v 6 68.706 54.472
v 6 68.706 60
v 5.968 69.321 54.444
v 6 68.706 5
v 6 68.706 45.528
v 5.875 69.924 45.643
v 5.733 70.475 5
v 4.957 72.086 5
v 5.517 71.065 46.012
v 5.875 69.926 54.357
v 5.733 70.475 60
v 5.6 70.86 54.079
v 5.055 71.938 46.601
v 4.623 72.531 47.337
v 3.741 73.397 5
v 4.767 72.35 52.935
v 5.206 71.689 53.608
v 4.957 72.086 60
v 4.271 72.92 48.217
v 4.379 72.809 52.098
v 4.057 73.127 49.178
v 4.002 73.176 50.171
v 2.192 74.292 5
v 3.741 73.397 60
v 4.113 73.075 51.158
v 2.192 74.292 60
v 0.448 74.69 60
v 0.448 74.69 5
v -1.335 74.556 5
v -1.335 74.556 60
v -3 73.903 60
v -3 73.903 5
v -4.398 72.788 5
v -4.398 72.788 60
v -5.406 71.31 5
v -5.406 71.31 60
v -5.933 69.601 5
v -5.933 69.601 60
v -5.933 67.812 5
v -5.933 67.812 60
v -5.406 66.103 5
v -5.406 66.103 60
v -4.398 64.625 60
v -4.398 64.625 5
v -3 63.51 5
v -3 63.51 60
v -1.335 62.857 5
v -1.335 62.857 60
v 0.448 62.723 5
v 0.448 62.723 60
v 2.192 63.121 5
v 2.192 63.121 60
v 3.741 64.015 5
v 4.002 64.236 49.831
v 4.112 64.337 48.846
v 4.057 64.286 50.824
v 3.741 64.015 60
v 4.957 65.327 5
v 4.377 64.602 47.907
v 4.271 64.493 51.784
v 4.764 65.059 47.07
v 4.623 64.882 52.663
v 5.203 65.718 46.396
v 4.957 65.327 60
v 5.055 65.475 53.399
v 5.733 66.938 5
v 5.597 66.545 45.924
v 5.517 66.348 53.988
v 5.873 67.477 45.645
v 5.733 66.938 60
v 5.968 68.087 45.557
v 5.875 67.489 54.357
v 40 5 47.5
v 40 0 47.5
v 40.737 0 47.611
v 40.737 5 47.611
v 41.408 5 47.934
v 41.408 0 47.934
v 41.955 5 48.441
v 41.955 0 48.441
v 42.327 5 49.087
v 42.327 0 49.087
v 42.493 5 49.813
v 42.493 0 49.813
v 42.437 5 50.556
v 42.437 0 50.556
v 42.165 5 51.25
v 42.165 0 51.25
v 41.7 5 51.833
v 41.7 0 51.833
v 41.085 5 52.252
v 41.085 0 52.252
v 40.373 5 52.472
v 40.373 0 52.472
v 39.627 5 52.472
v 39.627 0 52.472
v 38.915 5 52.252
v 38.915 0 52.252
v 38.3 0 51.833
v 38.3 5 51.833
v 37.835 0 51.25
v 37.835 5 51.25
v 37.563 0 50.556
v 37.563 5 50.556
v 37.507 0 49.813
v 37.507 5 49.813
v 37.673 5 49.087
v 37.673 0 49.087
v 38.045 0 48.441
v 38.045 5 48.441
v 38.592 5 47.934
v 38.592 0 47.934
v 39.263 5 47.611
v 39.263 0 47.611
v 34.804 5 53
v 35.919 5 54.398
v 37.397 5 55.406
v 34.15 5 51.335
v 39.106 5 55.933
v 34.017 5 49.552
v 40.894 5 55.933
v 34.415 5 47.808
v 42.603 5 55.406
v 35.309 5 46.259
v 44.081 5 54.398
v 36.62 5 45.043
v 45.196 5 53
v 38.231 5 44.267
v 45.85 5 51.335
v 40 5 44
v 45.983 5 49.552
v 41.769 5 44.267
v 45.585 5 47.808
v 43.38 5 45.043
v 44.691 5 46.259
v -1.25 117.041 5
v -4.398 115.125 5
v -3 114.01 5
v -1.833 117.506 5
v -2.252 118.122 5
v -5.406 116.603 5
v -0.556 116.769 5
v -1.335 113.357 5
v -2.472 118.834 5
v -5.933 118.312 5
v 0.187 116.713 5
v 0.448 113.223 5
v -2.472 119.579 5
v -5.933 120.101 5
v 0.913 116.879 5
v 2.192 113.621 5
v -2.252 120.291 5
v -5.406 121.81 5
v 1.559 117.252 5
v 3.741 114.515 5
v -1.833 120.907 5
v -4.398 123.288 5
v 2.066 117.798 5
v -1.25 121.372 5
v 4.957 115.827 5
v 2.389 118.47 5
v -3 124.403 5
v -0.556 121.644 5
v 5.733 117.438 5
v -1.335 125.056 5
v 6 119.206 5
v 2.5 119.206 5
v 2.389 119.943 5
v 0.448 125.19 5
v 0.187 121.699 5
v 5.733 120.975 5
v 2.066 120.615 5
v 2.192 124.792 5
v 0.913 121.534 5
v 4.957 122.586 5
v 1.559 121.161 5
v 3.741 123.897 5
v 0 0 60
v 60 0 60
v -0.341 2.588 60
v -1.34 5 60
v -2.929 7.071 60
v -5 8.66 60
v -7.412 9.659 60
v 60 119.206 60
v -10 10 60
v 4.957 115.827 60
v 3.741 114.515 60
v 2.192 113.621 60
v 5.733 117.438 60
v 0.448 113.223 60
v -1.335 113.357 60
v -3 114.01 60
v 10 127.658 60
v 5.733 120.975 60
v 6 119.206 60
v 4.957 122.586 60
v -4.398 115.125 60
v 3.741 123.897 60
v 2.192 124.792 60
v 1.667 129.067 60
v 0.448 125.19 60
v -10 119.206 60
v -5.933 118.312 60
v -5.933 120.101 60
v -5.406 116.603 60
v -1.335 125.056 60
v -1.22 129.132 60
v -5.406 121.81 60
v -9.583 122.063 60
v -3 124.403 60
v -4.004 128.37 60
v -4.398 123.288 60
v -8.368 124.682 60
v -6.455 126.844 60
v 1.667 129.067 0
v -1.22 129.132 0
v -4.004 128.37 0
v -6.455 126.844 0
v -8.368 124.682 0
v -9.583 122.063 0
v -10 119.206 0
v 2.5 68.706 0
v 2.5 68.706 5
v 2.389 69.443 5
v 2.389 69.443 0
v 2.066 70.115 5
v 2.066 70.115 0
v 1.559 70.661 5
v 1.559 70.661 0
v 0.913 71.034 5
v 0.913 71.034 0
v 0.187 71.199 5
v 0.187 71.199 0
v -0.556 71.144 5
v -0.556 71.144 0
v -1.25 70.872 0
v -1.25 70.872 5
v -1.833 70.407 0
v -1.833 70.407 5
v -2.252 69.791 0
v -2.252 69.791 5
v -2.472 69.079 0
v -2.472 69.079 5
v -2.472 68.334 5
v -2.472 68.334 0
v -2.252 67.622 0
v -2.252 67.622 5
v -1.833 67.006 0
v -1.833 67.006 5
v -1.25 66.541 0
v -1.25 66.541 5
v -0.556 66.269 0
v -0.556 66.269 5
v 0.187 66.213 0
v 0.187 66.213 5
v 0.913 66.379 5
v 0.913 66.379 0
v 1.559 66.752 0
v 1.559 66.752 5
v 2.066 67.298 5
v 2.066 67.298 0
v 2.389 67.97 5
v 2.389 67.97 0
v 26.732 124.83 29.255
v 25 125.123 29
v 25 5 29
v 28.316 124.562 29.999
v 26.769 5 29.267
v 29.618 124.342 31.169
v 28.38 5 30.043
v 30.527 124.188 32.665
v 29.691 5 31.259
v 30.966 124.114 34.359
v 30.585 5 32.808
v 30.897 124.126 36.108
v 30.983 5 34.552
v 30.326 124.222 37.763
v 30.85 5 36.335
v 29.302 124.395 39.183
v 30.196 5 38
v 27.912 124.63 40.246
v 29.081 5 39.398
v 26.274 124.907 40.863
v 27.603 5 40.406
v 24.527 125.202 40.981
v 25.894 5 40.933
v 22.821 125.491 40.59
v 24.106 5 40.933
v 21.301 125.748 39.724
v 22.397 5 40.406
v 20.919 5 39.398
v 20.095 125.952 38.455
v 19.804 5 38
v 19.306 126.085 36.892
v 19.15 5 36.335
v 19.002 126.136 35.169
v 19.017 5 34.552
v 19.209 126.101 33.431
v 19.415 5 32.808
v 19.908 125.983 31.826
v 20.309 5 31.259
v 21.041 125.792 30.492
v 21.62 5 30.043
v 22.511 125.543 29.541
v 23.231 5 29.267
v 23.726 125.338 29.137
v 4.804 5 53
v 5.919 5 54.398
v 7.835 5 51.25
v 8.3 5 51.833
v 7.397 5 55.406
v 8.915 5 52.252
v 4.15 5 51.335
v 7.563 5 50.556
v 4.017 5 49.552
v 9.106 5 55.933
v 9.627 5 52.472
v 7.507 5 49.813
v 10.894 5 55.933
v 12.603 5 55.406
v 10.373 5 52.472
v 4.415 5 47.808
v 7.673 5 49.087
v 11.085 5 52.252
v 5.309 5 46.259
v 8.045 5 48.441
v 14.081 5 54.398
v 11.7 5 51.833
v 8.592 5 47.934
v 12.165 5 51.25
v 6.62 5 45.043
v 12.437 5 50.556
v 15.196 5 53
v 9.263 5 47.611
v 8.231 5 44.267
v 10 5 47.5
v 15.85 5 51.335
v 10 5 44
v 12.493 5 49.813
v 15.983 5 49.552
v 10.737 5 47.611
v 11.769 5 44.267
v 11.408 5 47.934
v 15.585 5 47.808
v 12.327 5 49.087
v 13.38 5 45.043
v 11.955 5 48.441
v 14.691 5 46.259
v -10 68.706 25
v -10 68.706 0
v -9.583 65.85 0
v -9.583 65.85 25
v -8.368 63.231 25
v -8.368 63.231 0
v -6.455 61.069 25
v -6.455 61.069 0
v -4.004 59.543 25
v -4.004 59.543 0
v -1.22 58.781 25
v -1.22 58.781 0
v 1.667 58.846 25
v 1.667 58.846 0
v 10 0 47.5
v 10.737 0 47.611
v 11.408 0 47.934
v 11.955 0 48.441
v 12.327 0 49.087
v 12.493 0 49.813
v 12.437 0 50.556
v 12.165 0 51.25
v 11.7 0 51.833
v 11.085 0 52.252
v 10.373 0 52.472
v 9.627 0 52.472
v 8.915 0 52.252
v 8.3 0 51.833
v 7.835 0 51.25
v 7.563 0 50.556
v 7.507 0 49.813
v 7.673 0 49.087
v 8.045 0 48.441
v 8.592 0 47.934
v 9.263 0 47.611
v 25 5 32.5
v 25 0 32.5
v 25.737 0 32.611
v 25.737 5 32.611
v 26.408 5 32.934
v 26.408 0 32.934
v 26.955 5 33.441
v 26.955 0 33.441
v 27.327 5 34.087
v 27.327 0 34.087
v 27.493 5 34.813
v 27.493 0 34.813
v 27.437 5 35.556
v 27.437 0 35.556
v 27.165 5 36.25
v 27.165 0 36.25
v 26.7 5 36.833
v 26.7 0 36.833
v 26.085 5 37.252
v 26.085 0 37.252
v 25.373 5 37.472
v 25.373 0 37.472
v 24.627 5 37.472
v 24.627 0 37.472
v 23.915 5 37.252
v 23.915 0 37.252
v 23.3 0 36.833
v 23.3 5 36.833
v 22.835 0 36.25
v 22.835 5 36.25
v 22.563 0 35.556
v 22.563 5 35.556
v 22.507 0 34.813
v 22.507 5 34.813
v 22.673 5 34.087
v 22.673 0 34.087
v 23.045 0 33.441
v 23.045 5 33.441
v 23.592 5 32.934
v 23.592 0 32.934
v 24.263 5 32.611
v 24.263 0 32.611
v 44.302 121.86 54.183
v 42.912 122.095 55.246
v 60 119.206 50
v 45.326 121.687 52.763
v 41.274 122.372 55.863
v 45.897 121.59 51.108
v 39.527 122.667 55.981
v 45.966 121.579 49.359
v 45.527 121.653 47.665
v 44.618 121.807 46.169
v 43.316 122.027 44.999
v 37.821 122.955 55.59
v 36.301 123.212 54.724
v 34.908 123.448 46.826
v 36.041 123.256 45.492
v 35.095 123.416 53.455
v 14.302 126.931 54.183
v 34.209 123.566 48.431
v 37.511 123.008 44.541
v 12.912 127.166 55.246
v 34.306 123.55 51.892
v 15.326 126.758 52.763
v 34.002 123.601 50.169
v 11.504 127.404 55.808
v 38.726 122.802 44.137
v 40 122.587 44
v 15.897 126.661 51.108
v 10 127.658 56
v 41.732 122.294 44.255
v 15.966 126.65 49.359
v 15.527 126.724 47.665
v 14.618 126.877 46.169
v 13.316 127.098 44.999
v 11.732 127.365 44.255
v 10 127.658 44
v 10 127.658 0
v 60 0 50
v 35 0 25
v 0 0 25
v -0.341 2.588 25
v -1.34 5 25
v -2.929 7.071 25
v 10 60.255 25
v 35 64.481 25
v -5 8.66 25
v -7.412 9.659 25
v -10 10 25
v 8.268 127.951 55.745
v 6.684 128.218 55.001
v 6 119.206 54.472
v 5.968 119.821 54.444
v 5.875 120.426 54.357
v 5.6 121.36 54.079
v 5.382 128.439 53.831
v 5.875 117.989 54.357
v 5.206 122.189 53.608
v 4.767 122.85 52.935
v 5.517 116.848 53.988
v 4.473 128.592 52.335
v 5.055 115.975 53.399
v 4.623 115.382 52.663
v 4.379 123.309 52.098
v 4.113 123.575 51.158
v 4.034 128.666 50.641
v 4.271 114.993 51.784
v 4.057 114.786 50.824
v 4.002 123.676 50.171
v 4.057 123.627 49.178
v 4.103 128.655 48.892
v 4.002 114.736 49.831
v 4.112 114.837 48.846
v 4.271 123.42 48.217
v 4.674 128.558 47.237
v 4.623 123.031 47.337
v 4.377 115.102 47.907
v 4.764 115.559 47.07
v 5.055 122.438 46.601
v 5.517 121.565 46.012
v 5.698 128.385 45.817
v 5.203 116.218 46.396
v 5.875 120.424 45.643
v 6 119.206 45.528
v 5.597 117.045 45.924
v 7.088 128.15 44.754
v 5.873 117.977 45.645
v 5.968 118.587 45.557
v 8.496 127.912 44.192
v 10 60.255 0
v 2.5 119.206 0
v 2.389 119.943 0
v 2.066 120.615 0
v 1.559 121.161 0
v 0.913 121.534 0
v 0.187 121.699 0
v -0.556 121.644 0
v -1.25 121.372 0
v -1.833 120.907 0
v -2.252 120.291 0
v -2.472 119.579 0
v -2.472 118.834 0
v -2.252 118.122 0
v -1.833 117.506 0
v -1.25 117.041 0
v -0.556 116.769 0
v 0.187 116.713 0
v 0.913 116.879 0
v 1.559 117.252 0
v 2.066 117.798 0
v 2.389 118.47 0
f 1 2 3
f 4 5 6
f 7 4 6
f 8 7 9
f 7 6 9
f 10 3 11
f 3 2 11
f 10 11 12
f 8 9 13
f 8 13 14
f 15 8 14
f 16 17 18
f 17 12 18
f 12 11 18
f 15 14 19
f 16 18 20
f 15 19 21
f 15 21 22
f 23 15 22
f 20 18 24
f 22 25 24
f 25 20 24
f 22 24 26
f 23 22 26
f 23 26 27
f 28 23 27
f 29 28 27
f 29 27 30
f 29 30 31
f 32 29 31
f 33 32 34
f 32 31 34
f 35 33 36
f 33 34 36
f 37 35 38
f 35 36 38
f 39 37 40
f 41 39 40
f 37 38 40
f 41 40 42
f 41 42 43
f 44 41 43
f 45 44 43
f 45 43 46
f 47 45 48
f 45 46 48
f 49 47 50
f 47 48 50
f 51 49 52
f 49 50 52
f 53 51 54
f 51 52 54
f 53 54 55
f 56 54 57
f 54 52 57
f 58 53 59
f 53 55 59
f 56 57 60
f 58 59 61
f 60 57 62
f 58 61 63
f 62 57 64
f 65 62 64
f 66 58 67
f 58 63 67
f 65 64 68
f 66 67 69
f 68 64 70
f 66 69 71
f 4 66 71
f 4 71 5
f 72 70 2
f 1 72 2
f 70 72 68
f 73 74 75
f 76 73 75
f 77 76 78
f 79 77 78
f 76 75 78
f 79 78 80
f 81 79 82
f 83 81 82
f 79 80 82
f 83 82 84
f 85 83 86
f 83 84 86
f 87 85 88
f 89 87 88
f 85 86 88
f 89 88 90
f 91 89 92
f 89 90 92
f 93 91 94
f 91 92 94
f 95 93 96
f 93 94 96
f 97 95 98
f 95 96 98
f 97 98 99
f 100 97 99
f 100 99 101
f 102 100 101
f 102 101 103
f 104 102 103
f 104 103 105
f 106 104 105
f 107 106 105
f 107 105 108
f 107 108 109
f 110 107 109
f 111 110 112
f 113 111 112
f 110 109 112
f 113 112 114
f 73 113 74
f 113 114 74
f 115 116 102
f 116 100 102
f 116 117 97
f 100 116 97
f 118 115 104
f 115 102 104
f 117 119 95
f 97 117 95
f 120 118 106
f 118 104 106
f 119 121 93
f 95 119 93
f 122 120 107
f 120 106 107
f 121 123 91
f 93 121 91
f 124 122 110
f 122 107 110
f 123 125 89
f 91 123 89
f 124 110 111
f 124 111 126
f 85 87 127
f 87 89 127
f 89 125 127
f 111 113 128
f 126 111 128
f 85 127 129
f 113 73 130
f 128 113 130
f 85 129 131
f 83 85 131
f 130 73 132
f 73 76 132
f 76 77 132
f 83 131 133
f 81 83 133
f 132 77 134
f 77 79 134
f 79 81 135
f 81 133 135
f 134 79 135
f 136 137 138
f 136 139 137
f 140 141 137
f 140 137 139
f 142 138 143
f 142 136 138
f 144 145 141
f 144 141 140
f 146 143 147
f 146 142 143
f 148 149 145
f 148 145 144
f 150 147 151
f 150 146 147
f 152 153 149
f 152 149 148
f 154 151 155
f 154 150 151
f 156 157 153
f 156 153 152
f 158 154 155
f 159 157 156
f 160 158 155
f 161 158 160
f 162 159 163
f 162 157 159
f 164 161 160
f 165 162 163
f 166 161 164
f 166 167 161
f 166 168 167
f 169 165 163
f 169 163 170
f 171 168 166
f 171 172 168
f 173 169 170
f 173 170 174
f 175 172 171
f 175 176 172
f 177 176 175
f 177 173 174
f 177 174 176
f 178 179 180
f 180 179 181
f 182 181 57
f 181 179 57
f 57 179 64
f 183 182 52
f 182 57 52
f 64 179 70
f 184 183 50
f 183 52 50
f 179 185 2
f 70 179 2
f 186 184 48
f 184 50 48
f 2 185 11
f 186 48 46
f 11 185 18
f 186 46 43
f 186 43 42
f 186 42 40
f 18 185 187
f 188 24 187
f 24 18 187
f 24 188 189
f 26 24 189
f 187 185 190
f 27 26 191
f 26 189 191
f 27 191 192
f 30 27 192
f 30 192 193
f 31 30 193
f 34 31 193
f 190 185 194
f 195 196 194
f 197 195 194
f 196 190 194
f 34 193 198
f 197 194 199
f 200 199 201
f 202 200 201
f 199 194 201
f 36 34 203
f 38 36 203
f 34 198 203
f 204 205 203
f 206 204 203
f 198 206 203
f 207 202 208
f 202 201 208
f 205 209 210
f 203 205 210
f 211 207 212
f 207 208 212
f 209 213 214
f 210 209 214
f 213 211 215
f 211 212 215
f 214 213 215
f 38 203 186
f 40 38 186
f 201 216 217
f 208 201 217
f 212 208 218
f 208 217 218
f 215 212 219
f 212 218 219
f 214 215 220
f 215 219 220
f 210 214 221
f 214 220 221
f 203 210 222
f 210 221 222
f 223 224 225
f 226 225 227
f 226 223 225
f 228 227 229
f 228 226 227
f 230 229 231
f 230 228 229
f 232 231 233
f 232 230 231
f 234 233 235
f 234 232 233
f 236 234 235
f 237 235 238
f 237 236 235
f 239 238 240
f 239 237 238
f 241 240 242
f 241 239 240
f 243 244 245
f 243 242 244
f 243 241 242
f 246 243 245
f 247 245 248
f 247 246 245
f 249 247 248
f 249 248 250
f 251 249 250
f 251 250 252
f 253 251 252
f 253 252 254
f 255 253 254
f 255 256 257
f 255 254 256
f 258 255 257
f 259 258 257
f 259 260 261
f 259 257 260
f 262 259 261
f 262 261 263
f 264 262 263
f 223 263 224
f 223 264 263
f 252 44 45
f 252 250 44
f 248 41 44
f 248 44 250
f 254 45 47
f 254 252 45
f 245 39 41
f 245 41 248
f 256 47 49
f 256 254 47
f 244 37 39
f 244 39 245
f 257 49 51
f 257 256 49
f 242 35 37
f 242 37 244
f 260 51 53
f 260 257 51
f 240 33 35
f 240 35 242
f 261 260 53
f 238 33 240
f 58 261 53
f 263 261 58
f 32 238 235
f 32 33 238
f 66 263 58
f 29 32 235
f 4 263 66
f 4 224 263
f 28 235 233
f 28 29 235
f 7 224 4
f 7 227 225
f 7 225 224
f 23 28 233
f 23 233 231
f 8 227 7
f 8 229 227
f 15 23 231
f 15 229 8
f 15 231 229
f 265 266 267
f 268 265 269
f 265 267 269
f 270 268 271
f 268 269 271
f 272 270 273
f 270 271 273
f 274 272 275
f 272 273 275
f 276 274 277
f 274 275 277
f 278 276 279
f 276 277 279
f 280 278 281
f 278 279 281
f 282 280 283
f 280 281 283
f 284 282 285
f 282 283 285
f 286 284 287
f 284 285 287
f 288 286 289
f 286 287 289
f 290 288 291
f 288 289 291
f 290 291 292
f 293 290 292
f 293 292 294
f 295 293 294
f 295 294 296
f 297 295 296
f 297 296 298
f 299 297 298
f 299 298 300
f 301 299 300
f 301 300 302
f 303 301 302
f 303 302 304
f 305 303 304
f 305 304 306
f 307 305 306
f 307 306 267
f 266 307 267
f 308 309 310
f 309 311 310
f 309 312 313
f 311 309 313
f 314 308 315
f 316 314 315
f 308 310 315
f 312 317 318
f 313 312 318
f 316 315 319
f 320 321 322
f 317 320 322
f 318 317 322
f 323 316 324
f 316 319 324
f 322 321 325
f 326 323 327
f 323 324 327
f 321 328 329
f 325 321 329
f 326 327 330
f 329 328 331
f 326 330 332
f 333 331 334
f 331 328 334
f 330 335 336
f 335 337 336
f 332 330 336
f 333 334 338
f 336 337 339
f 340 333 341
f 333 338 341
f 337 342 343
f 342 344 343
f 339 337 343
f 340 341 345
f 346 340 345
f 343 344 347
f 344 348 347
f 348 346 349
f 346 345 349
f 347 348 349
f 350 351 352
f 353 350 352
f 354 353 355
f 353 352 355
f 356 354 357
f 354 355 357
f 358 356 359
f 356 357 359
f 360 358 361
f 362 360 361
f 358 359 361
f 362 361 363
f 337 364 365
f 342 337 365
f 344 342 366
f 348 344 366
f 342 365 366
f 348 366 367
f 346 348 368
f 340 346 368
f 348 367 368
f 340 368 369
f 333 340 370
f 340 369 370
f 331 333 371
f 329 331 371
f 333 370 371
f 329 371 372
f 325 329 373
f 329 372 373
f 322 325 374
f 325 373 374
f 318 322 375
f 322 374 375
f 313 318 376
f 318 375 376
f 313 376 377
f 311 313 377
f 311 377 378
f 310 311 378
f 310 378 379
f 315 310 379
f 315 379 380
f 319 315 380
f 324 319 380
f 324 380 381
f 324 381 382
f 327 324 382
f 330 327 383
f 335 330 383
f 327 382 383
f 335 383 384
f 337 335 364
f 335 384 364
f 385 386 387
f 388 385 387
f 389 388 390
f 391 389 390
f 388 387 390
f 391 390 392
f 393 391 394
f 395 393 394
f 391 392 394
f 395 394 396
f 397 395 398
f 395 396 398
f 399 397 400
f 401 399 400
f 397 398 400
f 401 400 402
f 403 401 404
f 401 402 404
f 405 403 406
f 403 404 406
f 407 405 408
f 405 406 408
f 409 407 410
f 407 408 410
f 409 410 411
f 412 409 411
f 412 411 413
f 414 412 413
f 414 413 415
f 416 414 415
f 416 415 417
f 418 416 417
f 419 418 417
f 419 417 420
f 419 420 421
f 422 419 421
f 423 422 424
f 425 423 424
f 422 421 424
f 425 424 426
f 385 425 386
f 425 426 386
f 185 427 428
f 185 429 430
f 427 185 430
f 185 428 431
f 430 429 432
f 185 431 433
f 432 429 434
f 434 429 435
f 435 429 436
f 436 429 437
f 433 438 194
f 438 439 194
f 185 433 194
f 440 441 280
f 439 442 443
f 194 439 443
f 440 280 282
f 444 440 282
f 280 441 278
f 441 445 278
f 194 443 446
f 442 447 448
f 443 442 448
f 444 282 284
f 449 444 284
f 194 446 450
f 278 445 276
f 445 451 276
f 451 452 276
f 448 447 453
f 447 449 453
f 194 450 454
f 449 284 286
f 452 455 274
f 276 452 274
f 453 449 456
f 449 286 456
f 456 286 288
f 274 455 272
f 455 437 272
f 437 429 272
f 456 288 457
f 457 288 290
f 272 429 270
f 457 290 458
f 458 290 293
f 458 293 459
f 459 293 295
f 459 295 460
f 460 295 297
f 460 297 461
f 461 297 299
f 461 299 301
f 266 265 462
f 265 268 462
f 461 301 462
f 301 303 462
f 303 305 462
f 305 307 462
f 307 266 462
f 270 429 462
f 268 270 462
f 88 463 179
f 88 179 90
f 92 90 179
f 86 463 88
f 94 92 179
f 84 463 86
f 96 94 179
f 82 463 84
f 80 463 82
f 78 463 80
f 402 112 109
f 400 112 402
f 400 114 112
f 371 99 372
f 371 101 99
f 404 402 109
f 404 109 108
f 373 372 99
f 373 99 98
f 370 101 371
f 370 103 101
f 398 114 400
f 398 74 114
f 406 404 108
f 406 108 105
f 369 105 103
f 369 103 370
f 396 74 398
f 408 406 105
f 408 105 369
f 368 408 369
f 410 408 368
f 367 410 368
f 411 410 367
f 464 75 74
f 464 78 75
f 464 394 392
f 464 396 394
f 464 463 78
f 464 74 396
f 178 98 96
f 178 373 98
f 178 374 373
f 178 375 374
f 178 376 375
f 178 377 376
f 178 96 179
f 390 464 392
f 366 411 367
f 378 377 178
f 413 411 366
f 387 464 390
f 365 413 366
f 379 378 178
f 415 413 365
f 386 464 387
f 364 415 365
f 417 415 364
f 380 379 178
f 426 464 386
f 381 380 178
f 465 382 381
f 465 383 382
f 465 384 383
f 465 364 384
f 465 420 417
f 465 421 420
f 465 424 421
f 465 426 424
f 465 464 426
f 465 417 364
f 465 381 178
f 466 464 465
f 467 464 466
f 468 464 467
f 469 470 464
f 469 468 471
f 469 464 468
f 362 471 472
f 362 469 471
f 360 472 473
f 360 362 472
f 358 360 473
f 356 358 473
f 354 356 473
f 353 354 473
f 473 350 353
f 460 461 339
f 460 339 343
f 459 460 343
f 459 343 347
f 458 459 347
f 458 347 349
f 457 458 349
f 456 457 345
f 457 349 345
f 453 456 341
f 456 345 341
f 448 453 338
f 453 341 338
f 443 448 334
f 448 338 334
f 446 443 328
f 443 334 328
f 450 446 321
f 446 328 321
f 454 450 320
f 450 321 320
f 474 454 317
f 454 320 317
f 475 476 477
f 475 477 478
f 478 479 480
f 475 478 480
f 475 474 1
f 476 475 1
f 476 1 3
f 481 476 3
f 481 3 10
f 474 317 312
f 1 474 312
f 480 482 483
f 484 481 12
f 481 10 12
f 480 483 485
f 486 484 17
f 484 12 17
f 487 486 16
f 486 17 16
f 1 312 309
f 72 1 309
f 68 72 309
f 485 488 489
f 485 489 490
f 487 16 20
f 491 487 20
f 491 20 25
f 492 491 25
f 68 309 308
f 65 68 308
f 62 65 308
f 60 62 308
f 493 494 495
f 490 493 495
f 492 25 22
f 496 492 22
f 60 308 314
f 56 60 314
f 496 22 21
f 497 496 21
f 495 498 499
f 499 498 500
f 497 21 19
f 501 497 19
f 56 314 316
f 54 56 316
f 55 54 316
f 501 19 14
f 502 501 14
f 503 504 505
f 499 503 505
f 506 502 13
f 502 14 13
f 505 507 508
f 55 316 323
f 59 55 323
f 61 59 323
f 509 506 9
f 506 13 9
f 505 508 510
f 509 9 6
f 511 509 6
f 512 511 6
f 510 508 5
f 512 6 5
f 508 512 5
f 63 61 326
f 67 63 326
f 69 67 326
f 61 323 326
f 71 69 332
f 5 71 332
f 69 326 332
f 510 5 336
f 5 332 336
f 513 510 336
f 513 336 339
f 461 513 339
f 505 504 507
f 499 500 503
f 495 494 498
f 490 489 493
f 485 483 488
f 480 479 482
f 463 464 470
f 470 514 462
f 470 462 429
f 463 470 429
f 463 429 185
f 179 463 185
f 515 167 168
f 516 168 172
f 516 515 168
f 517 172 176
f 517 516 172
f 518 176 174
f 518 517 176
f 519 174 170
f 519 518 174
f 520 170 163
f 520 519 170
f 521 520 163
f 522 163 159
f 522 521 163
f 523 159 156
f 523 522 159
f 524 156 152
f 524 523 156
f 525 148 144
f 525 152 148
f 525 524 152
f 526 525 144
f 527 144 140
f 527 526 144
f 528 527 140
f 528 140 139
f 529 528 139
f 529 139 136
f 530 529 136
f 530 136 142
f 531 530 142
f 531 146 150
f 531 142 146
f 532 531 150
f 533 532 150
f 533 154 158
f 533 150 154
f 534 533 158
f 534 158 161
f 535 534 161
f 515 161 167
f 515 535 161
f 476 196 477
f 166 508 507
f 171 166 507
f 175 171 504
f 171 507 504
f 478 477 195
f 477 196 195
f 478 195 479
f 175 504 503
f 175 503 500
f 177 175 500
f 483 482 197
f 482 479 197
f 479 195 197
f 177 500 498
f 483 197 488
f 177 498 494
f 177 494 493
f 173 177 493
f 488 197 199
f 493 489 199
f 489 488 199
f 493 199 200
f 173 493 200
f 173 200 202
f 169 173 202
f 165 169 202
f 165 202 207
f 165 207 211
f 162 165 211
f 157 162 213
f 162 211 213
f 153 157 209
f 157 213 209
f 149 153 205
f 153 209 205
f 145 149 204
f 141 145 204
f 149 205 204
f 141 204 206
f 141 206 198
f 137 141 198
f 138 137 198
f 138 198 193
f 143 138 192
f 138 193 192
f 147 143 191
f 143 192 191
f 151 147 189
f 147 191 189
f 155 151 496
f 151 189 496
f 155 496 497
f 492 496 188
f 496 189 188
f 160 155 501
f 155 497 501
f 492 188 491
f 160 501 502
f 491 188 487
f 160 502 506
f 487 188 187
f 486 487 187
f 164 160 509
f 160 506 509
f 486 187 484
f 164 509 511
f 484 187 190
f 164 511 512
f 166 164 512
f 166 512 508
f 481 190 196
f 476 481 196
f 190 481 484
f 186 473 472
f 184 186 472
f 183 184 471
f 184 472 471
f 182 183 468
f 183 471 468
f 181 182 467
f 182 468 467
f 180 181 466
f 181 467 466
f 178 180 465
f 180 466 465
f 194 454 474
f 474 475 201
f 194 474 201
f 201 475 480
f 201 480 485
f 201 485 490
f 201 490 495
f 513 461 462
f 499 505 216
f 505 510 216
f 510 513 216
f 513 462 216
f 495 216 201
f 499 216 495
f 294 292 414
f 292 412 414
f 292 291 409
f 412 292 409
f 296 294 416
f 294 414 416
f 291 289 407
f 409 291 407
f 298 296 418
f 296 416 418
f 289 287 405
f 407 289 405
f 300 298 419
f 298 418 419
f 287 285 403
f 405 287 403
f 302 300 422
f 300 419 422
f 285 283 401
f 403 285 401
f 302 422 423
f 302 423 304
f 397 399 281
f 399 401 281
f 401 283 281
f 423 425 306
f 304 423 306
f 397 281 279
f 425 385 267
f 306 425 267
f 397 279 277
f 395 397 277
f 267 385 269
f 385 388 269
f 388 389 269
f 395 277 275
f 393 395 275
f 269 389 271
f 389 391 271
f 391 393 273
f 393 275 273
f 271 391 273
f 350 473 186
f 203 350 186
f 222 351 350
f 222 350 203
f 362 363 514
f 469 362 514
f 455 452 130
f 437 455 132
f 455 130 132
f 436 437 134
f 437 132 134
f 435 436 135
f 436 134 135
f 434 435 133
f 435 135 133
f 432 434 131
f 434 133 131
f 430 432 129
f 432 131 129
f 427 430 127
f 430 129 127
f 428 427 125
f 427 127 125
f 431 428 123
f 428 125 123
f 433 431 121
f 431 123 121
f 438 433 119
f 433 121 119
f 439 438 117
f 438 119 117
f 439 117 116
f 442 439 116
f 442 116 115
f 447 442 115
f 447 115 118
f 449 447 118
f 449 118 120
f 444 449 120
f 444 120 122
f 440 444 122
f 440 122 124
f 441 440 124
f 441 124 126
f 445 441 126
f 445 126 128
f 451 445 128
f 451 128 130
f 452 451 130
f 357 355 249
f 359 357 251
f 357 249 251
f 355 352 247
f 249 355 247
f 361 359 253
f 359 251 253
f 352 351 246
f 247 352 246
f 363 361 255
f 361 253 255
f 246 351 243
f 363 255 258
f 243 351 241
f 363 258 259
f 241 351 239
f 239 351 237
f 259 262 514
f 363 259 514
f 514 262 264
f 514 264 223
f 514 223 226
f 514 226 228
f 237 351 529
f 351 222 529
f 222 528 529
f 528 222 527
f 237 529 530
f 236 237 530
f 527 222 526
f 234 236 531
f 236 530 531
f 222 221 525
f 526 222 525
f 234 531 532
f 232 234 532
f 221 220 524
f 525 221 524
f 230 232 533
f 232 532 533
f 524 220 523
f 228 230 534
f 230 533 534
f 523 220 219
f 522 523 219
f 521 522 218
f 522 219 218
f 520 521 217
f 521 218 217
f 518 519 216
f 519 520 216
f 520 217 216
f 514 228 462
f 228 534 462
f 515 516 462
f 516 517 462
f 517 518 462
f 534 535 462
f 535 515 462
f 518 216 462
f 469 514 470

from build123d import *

# Parameters (mm, degrees)
SKETCH1_W           = 20
SKETCH1_H           = 130
SKETCH1_R           = 2.5
BOSS_EXTRUDE1_DEPTH = 60
BOSS_EXTRUDE2_DEPTH = 130
CUT_EXTRUDE2_DEPTH  = 156.241746963
CUT_EXTRUDE3_DEPTH  = 25
SKETCH5_R           = 10
CUT_EXTRUDE4_DEPTH  = 147.694623422
SKETCH6_R           = 6
CUT_EXTRUDE8_DEPTH  = 55
SKETCH7_R           = 2.5
CUT_EXTRUDE9_DEPTH  = 5
SKETCH9_R           = 6
CUT_EXTRUDE10_DEPTH = 151.423561372


with BuildPart() as part:
    # Sketch1 → Boss-Extrude1 (new body)
    with BuildSketch(Plane.XY):
        with Locations((0, 65)):
            Rectangle(SKETCH1_W, SKETCH1_H)
        with Locations((0, 119.20647252)):
            Circle(SKETCH1_R, mode=Mode.SUBTRACT)
        with Locations((0, 68.70647252)):
            Circle(SKETCH1_R, mode=Mode.SUBTRACT)
    extrude(amount=BOSS_EXTRUDE1_DEPTH)

    # Sketch2 → Boss-Extrude2 (add)
    with BuildSketch(Plane(origin=(0, 130, 0), x_dir=(1, 0, 0), z_dir=(0, 1, 0))):
        Polygon((10, 0), (60, -50), (60, -60), (10, -60), align=None)
    extrude(amount=-BOSS_EXTRUDE2_DEPTH)

    # Sketch4 → Cut-Extrude2 (cut, through all)
    with BuildSketch(Plane(origin=(0, 0, 0), x_dir=(-1, 0, 0), z_dir=(0, 0, -1))):
        with BuildLine():
            ThreePointArc((-1.666666667, 129.066605492), (6.454972244, 126.844098678), (10, 119.20647252))
            Line((10, 119.20647252), (10, 130))
            Line((10, 130), (-10, 130))
            Line((-10, 130), (-10, 127.658015067))
            Line((-10, 127.658015067), (-1.666666667, 129.066605492))
        make_face()
        Polygon((-60, 130), (-60, 119.20647252), (-10, 127.658015067), (-10, 130), align=None)
    extrude(amount=-CUT_EXTRUDE2_DEPTH, mode=Mode.SUBTRACT)

    # Sketch4<5> → Cut-Extrude3 (cut)
    with BuildSketch(Plane(origin=(0, 0, 0), x_dir=(-1, 0, 0), z_dir=(0, 0, -1))):
        with BuildLine():
            Line((10, 0), (10, 68.70647252))
            ThreePointArc((10, 68.70647252), (6.454972244, 61.068846362), (-1.666666667, 58.846339548))
            Line((-1.666666667, 58.846339548), (-10, 60.254929973))
            Line((-10, 60.254929973), (-10, 0))
            Line((-10, 0), (10, 0))
        make_face()
        Polygon((-10, 60.254929973), (-60, 68.70647252), (-60, 0), (-10, 0), align=None)
    extrude(amount=-CUT_EXTRUDE3_DEPTH, mode=Mode.SUBTRACT)

    # Sketch5 → Cut-Extrude4 (cut, through all)
    with BuildSketch(Plane(origin=(0, 0, 25), x_dir=(-1, 0, 0), z_dir=(0, 0, -1))):
        with Locations((10, 0)):
            Circle(SKETCH5_R)
    extrude(amount=-CUT_EXTRUDE4_DEPTH, mode=Mode.SUBTRACT)

    # Sketch6 → Cut-Extrude8 (cut)
    with BuildSketch(Plane.XY.offset(60)):
        with Locations((0, 119.20647252)):
            Circle(SKETCH6_R)
        with Locations((0, 68.70647252)):
            Circle(SKETCH6_R)
    extrude(amount=-CUT_EXTRUDE8_DEPTH, mode=Mode.SUBTRACT)

    # Sketch7 → Cut-Extrude9 (cut)
    with BuildSketch(Plane.XZ):
        with Locations(Location((10, 50, 0), (0, 0, 270))):
            Circle(SKETCH7_R)
        with Locations(Location((40, 50, 0), (0, 0, 270))):
            Circle(SKETCH7_R)
        with Locations(Location((25, 35, 0), (0, 0, 270))):
            Circle(SKETCH7_R)
    extrude(amount=-CUT_EXTRUDE9_DEPTH, mode=Mode.SUBTRACT)

    # Sketch9 → Cut-Extrude10 (cut, through all)
    with BuildSketch(Plane.XZ.offset(-5)):
        with Locations(Location((10, 50, 0), (0, 0, 270))):
            Circle(SKETCH9_R)
        with Locations(Location((25, 35, 0), (0, 0, 270))):
            Circle(SKETCH9_R)
        with Locations(Location((40, 50, 0), (0, 0, 270))):
            Circle(SKETCH9_R)
    extrude(amount=-CUT_EXTRUDE10_DEPTH, mode=Mode.SUBTRACT)


solid = part.part
